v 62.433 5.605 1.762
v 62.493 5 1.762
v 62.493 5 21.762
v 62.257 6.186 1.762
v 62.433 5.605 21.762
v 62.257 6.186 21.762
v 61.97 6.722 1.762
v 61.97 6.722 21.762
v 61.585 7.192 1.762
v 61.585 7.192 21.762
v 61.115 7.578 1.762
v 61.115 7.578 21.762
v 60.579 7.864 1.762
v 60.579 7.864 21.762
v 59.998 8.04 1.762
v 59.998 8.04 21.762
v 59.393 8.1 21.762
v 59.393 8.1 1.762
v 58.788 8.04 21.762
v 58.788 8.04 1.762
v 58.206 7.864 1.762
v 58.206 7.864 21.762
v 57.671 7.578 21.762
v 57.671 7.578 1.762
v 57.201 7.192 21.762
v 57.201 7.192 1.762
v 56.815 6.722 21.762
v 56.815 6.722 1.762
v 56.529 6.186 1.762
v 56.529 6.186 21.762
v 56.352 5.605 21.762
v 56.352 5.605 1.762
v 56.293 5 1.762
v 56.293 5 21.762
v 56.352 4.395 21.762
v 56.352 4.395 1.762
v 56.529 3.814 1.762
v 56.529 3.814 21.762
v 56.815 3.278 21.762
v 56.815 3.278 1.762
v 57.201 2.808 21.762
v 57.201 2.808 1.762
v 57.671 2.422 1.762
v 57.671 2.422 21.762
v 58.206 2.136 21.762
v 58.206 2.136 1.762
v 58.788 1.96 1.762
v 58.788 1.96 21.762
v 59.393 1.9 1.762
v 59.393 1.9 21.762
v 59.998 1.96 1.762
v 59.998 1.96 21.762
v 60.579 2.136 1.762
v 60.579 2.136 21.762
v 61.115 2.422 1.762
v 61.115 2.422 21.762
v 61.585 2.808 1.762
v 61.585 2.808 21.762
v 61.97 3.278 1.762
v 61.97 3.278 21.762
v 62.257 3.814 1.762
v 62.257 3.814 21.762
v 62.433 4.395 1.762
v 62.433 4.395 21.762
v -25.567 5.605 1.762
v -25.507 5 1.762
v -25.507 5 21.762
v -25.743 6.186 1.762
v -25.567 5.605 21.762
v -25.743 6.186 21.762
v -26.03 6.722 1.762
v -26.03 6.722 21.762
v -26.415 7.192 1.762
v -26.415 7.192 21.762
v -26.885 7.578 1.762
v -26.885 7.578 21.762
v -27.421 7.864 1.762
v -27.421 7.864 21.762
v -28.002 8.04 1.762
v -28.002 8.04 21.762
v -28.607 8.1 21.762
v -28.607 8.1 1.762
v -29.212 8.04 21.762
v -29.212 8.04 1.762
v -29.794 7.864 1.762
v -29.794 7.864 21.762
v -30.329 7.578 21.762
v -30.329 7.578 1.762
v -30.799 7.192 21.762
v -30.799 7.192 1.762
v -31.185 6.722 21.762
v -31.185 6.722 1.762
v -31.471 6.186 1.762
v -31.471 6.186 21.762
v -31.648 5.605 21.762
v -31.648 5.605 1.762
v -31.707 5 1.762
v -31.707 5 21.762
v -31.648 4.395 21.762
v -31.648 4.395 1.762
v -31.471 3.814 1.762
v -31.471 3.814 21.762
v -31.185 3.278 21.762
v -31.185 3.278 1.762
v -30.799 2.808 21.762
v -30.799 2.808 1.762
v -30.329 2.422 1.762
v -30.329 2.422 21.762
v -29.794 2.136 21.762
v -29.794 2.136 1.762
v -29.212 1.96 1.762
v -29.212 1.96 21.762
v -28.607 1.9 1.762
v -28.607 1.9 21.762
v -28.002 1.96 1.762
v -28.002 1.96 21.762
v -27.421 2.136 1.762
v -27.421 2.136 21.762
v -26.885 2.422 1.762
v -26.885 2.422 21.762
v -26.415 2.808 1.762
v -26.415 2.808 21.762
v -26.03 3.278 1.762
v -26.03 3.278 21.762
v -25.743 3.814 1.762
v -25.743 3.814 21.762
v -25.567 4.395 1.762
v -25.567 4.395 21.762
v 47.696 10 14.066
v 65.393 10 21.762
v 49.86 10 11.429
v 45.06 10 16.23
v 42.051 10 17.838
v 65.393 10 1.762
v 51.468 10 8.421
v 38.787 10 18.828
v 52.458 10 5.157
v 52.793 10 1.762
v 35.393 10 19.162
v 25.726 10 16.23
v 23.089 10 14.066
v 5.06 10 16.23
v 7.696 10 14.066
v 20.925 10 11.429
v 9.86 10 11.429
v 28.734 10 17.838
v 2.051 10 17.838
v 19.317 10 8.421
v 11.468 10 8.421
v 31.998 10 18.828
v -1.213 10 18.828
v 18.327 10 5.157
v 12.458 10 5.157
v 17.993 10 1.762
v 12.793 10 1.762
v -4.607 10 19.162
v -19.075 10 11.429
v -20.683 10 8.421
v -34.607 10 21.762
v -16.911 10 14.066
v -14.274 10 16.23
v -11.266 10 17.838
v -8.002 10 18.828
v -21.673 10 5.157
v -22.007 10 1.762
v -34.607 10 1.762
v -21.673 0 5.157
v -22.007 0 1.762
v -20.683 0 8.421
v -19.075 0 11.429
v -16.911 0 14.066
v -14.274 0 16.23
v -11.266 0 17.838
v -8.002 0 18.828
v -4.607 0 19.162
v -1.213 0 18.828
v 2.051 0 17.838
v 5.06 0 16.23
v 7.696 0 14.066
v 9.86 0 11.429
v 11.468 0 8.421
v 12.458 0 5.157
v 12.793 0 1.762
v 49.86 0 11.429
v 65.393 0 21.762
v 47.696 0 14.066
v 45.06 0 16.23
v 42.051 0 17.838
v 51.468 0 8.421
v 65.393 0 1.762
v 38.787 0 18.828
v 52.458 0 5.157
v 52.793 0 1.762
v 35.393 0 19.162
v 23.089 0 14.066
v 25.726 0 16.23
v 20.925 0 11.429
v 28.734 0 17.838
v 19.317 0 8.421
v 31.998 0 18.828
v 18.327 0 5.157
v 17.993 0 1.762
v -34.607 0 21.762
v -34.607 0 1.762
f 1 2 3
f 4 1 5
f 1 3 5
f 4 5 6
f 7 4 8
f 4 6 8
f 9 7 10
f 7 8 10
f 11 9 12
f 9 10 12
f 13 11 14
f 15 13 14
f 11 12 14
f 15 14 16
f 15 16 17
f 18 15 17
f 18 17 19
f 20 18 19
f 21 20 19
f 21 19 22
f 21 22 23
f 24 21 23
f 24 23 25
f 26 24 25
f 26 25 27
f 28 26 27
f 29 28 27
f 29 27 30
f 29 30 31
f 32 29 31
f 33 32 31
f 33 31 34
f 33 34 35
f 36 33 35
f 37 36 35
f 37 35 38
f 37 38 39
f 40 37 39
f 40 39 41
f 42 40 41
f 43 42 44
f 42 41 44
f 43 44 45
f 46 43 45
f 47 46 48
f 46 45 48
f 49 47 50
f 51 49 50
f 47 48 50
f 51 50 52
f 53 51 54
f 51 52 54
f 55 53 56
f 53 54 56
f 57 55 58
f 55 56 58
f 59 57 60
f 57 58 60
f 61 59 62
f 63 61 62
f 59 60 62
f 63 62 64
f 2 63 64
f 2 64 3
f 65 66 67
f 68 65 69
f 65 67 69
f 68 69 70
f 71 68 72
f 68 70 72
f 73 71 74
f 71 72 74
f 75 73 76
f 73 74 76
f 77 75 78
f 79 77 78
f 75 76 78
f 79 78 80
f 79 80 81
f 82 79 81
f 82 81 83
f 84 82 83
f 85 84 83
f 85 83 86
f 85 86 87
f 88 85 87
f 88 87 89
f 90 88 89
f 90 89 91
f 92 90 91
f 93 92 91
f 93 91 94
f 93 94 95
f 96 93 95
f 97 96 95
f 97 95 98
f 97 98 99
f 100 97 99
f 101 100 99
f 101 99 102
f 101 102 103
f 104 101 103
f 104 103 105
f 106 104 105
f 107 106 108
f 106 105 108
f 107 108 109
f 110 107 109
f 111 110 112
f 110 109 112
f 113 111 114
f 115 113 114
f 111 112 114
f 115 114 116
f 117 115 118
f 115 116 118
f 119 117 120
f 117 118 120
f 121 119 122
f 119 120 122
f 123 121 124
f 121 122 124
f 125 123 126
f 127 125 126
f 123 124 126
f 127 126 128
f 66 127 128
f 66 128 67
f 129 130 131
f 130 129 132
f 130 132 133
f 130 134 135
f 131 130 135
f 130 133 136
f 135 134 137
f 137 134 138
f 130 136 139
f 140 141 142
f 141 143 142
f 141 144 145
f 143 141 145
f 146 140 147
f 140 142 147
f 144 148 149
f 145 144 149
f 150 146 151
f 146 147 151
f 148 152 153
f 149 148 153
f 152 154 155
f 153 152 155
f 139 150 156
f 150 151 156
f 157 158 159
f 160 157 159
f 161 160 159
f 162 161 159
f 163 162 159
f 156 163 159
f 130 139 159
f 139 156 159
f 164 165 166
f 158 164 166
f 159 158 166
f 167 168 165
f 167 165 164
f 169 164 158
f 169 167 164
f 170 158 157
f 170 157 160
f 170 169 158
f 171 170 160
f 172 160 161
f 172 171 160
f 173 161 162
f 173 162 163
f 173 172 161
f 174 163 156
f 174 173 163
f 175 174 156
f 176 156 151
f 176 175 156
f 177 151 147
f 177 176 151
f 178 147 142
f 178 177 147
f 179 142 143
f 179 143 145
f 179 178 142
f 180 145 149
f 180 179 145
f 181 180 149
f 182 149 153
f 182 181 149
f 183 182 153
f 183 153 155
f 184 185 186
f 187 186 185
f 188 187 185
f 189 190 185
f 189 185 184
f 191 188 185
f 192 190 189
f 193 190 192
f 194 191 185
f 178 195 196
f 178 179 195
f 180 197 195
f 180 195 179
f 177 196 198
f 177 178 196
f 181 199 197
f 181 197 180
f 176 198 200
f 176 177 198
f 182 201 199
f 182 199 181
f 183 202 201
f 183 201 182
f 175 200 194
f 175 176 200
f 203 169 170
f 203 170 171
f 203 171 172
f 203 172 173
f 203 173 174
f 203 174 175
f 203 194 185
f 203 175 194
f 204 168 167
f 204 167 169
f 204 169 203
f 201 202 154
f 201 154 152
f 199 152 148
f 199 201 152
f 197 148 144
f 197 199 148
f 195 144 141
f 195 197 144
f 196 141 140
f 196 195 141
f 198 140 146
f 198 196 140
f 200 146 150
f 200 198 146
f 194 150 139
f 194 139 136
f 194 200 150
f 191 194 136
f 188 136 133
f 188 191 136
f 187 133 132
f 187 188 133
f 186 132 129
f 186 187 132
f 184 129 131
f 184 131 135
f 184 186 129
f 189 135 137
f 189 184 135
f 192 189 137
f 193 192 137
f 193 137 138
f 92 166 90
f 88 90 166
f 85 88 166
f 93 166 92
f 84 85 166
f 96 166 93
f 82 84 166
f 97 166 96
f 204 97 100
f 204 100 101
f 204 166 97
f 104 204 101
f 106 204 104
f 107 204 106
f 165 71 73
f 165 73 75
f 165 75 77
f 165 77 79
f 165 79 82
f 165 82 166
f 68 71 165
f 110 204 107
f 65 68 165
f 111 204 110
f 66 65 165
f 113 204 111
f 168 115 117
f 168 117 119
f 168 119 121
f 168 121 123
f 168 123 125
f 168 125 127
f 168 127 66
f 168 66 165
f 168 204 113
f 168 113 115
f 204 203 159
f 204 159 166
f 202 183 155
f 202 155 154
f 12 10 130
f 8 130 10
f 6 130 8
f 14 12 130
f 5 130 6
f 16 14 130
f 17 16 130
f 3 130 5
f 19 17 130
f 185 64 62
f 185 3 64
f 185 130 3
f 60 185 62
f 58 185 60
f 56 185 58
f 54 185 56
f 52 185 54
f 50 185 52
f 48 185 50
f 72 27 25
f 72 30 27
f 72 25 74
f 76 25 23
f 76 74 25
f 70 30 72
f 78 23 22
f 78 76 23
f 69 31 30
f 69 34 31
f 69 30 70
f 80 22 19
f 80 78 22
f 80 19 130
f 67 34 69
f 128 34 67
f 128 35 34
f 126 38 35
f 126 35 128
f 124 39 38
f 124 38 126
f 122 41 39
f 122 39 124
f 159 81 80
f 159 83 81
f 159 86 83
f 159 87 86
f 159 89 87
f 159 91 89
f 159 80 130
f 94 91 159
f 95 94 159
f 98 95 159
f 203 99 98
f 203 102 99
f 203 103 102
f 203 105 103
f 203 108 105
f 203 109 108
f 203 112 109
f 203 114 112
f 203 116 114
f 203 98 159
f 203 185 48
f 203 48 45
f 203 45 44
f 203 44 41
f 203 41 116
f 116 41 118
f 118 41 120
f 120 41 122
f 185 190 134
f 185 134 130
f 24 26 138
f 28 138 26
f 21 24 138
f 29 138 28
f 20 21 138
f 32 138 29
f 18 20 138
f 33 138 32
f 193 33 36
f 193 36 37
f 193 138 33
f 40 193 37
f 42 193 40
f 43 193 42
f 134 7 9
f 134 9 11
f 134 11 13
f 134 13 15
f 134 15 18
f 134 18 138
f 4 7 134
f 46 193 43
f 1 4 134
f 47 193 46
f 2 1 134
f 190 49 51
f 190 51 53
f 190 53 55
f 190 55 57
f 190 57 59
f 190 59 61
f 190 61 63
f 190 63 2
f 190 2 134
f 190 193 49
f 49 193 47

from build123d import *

# Parameters (mm, degrees)
BOSS_EXTRUDE1_DEPTH = 10
SKETCH2_R           = 3.1
CUT_EXTRUDE1_DEPTH  = 70.110171815


with BuildPart() as part:
    # Sketch1 → Boss-Extrude1 (new body)
    with BuildSketch(Plane(origin=(0, 0, 0), x_dir=(1, 0, 0), z_dir=(0, 1, 0))):
        with BuildLine():
            Line((12.792781316, -1.762208068), (17.992781316, -1.762208068))
            ThreePointArc((17.992781316, -1.762208068), (35.392781316, -19.162208068), (52.792781316, -1.762208068))
            Line((52.792781316, -1.762208068), (65.392781316, -1.762208068))
            Line((65.392781316, -1.762208068), (65.392781316, -21.762208068))
            Line((65.392781316, -21.762208068), (-34.607218684, -21.762208068))
            Line((-34.607218684, -21.762208068), (-34.607218684, -1.762208068))
            Line((-34.607218684, -1.762208068), (-22.007218684, -1.762208068))
            ThreePointArc((-22.007218684, -1.762208068), (-4.607218684, -19.162208068), (12.792781316, -1.762208068))
        make_face()
    extrude(amount=BOSS_EXTRUDE1_DEPTH)

    # Sketch2 → Cut-Extrude1 (cut, through all)
    with BuildSketch(Plane.XY.offset(21.762208068)):
        with Locations((-28.607218684, 5)):
            Circle(SKETCH2_R)
        with Locations((59.392781316, 5)):
            Circle(SKETCH2_R)
    extrude(amount=-CUT_EXTRUDE1_DEPTH, mode=Mode.SUBTRACT)


solid = part.part
